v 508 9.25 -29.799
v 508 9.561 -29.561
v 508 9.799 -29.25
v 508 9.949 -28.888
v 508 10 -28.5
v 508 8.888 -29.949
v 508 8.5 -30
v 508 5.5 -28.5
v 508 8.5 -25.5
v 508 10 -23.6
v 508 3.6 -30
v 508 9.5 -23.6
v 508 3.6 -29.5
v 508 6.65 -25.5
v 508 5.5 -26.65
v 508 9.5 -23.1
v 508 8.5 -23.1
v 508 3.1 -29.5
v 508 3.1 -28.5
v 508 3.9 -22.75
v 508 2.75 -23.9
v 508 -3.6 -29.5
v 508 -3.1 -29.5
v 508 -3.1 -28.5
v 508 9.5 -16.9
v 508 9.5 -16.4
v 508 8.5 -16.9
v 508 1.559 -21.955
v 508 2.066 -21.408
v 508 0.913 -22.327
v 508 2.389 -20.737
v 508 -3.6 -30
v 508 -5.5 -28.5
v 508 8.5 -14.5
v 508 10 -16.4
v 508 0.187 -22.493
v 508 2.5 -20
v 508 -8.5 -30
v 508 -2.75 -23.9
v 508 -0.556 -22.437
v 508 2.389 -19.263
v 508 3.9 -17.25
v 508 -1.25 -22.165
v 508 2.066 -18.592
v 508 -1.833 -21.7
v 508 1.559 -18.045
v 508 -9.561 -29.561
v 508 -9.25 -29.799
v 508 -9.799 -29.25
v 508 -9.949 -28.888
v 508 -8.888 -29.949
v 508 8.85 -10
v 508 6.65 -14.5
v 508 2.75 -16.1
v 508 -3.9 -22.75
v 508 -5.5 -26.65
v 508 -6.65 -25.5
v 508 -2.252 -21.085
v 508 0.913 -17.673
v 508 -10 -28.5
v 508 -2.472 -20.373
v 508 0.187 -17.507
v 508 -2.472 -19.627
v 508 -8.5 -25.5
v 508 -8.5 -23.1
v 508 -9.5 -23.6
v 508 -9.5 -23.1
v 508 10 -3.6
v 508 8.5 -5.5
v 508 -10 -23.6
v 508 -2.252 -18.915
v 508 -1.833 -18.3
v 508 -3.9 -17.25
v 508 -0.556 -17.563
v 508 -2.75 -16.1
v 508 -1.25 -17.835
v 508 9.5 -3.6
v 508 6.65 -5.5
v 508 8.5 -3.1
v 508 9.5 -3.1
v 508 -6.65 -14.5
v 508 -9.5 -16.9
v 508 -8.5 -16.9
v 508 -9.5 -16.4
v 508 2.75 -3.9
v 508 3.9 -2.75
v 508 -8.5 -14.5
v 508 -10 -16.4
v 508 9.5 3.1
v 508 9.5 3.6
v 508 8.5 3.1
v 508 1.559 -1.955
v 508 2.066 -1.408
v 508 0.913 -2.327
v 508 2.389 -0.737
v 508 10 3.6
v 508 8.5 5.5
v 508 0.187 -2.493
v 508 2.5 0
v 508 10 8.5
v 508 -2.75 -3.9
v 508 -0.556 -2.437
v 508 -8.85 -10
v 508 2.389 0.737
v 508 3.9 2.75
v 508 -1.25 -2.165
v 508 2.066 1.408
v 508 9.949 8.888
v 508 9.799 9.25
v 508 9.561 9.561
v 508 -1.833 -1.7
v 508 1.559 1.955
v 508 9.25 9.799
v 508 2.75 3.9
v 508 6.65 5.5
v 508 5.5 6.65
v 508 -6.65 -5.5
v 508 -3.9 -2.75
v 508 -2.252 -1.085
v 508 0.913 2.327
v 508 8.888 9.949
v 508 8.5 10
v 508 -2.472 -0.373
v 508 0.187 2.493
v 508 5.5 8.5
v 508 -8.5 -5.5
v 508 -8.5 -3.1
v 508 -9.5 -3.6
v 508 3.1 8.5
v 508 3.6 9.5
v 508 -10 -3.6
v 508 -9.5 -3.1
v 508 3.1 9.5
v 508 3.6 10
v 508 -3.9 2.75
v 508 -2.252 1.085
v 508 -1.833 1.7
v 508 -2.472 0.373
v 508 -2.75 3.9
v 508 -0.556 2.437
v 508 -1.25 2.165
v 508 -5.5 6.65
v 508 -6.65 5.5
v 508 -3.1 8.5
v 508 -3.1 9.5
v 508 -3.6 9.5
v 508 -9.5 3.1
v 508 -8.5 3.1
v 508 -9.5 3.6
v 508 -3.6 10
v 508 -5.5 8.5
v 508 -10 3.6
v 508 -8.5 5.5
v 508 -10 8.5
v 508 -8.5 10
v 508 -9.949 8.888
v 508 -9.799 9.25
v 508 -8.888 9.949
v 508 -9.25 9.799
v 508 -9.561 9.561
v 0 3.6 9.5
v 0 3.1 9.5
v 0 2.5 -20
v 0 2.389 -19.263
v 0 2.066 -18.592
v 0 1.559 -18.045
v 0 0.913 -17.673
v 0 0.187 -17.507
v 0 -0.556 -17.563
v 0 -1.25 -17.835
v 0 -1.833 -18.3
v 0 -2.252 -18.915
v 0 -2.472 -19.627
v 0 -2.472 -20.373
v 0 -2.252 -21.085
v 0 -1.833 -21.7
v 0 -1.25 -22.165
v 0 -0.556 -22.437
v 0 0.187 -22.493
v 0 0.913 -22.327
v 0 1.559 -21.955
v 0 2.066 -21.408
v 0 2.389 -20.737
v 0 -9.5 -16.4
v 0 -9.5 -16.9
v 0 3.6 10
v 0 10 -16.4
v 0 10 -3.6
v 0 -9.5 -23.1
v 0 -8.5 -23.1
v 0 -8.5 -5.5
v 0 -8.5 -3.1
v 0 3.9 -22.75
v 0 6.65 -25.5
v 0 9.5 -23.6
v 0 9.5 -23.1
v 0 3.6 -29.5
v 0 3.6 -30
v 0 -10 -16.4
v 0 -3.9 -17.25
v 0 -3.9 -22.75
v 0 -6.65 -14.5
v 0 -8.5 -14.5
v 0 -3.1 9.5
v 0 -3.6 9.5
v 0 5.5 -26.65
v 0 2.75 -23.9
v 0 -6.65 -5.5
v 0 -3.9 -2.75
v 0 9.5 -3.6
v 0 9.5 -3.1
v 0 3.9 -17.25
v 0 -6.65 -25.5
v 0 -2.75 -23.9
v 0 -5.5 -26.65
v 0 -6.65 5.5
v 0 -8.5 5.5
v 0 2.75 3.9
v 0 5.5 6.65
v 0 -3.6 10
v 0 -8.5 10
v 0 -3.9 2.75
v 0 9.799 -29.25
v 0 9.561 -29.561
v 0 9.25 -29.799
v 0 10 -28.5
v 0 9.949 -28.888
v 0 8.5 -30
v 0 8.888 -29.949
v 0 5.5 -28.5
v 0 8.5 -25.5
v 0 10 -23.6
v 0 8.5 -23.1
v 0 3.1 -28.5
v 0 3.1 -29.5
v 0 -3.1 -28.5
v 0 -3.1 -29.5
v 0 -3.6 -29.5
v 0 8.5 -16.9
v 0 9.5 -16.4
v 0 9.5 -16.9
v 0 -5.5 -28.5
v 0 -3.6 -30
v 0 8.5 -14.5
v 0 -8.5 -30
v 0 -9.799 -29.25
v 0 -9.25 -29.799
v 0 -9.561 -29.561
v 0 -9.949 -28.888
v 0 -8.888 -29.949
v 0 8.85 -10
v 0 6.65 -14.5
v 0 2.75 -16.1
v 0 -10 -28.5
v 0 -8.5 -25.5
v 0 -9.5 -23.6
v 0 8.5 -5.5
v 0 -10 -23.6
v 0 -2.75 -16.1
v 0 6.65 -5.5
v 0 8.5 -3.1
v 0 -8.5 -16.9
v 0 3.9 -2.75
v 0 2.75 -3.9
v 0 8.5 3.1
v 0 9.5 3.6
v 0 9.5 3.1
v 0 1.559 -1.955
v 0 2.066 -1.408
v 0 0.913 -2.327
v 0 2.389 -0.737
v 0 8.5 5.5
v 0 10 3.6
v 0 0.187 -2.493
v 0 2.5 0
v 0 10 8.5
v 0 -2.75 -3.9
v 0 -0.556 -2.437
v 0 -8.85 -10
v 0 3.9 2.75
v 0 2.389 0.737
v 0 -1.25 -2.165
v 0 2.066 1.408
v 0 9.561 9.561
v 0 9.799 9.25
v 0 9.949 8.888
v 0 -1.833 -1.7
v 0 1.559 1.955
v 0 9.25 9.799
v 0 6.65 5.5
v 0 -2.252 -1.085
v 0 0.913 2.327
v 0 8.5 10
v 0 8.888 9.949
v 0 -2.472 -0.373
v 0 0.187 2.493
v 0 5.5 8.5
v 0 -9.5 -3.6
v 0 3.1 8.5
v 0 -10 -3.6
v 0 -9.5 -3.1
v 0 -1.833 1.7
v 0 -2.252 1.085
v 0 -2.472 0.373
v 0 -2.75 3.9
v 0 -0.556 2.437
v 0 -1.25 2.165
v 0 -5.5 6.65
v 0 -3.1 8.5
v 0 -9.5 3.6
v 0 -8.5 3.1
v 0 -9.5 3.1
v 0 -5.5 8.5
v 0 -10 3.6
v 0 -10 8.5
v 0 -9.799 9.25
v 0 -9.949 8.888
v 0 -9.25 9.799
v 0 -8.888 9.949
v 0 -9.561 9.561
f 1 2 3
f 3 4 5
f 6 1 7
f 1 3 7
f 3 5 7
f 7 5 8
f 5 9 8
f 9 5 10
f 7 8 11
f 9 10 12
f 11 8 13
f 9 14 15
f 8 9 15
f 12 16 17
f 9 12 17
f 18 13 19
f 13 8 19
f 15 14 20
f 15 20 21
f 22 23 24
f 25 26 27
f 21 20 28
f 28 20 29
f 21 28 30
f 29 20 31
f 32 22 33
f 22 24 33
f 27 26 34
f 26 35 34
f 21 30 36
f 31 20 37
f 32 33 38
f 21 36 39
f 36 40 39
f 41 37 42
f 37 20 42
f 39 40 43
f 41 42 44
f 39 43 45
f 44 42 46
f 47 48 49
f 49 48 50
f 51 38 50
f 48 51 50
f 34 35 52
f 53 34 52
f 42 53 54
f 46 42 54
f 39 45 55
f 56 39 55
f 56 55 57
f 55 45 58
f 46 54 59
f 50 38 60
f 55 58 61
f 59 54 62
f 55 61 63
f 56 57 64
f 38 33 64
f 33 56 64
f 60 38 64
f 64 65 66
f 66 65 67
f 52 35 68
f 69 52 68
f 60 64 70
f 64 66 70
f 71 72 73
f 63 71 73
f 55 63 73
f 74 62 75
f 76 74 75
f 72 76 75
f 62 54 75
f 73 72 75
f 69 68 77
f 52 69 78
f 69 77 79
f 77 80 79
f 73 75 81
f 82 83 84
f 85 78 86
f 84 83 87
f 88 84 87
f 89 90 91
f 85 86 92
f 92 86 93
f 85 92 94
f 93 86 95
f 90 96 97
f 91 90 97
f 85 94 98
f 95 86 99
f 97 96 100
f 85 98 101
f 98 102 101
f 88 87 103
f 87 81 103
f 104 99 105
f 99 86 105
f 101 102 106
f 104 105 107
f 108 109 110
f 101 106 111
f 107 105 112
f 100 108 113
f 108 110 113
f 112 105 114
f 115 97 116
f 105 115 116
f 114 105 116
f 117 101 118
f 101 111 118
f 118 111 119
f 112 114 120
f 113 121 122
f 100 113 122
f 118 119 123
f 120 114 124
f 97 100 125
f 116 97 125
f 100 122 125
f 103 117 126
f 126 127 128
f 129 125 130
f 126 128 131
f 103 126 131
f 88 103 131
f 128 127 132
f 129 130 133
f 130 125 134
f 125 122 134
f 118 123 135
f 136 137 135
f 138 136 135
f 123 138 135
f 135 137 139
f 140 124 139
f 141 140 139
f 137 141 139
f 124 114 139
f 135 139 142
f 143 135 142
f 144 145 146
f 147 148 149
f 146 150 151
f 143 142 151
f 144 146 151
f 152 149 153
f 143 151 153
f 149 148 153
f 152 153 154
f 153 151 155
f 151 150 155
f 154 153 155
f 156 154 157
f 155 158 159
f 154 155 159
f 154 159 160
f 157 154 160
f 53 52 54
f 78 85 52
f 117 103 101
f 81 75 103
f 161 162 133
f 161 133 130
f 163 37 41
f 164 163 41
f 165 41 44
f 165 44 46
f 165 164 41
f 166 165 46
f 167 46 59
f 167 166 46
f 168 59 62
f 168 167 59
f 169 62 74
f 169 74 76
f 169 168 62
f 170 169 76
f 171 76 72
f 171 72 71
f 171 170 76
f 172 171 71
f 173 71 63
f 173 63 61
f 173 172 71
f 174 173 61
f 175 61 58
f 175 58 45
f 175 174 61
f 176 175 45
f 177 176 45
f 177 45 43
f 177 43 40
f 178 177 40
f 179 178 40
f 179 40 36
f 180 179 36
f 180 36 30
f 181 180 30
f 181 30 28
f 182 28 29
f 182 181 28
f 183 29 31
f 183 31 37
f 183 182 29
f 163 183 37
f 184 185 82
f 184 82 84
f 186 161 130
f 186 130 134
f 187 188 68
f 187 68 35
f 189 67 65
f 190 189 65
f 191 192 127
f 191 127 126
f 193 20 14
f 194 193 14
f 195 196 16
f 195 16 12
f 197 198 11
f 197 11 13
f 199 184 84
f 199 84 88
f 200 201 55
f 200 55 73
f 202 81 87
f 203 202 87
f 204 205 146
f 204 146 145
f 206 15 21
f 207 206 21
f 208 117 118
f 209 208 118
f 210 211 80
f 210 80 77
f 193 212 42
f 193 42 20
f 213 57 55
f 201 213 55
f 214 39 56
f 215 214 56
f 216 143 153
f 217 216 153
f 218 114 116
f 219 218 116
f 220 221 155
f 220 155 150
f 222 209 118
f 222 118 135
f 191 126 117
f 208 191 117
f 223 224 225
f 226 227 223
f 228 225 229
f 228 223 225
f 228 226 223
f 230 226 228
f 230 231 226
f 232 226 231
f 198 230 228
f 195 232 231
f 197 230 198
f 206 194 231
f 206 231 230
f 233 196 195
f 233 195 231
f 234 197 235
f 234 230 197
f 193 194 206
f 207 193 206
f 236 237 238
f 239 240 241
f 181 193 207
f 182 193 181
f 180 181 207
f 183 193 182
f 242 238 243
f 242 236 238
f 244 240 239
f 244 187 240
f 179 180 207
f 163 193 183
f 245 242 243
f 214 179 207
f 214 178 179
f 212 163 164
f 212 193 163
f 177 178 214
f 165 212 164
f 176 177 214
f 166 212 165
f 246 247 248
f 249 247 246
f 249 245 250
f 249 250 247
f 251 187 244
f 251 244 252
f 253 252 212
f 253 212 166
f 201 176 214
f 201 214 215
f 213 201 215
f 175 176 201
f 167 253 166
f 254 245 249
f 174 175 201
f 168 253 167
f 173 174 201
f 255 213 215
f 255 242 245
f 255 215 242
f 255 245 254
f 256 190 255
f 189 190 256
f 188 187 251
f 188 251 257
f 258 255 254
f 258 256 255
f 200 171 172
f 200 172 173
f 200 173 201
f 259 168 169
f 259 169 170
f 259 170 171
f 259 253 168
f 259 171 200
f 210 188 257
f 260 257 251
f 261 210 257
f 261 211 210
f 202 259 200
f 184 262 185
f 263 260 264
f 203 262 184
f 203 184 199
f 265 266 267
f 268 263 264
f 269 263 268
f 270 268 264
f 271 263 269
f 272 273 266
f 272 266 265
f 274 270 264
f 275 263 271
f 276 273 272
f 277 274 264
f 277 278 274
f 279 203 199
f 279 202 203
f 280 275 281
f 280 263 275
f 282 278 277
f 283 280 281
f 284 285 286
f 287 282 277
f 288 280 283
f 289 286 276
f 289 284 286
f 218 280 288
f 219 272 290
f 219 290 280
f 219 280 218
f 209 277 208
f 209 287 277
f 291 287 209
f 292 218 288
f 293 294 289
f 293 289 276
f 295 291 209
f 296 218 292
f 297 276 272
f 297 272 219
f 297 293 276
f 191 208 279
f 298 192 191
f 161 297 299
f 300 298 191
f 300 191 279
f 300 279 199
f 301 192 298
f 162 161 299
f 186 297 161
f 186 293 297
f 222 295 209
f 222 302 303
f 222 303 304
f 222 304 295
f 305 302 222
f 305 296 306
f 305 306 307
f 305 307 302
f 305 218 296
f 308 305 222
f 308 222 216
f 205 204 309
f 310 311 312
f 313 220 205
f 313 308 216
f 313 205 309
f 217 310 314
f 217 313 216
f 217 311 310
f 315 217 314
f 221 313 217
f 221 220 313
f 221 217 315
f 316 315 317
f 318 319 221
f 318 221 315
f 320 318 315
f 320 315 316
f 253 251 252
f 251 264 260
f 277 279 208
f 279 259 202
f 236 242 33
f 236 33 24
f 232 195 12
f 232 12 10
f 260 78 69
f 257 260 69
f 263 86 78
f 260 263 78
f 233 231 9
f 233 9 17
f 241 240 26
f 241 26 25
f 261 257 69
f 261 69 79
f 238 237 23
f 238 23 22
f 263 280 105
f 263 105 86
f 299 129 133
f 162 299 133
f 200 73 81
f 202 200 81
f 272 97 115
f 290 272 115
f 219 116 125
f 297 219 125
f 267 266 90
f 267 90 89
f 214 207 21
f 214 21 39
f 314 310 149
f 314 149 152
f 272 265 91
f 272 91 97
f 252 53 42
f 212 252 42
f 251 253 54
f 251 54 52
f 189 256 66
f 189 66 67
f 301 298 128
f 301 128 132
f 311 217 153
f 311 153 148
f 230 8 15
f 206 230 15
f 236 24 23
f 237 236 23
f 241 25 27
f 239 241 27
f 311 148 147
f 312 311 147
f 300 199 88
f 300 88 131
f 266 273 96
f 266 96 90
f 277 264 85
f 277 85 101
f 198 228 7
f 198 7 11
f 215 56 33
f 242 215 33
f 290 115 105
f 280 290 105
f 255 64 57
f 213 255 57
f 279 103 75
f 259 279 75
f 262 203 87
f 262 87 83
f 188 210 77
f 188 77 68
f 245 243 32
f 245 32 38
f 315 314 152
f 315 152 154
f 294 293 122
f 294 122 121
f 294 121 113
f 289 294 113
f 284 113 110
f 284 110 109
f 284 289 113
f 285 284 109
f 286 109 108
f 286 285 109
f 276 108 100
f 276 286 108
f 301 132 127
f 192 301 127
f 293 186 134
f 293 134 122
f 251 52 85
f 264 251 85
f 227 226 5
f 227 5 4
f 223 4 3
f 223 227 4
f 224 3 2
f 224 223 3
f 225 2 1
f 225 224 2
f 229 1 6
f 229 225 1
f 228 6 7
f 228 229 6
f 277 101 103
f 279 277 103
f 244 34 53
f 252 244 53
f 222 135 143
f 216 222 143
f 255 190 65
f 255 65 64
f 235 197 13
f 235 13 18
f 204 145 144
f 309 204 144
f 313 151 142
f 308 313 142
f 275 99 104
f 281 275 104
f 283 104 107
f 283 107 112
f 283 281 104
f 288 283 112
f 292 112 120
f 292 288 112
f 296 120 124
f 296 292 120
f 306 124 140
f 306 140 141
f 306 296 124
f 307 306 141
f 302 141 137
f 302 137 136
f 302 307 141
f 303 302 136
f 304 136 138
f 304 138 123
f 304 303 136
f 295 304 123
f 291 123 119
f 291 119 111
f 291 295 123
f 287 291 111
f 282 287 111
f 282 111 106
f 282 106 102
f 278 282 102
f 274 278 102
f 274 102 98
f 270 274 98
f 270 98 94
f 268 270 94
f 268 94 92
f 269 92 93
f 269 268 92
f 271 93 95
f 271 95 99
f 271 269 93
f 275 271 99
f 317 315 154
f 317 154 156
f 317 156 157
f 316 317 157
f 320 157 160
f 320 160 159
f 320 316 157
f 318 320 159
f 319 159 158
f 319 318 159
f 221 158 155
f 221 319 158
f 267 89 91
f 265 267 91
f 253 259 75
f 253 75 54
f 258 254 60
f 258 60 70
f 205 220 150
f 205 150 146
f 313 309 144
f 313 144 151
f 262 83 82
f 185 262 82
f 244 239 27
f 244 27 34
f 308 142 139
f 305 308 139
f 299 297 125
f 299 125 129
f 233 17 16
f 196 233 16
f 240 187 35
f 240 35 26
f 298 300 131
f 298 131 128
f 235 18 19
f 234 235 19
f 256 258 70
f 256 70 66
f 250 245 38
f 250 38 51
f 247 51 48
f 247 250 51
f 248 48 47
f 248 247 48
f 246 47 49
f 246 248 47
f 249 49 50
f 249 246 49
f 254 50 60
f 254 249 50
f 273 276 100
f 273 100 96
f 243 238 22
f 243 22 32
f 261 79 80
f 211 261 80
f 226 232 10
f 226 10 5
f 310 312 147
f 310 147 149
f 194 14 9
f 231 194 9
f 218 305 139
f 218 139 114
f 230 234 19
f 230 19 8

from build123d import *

# Parameters (mm, degrees)
SKETCH11_R               = 2.5
F_20_X_40_X_T1_5_1_DEPTH = 508


with BuildPart() as part:
    # Sketch11 → 铝型材 20 X 40 X T1.5(1) (new body)
    with BuildSketch(Plane.YZ):
        with BuildLine():
            Line((-3.6, 10), (-3.6, 9.5))
            Line((-3.6, 9.5), (-3.1, 9.5))
            Line((-3.1, 9.5), (-3.1, 8.5))
            Line((-3.1, 8.5), (-5.5, 8.5))
            Line((-5.5, 8.5), (-5.5, 6.65))
            Line((-5.5, 6.65), (-2.75, 3.9))
            Line((-2.75, 3.9), (2.75, 3.9))
            Line((2.75, 3.9), (5.5, 6.65))
            Line((5.5, 6.65), (5.5, 8.5))
            Line((5.5, 8.5), (3.1, 8.5))
            Line((3.1, 8.5), (3.1, 9.5))
            Line((3.1, 9.5), (3.6, 9.5))
            Line((3.6, 9.5), (3.6, 10))
            Line((3.6, 10), (8.5, 10))
            ThreePointArc((8.5, 10), (9.560660172, 9.560660172), (10, 8.5))
            Line((10, 8.5), (10, 3.6))
            Line((10, 3.6), (9.5, 3.6))
            Line((9.5, 3.6), (9.5, 3.1))
            Line((9.5, 3.1), (8.5, 3.1))
            Line((8.5, 3.1), (8.5, 5.5))
            Line((8.5, 5.5), (6.65, 5.5))
            Line((6.65, 5.5), (3.9, 2.75))
            Line((3.9, 2.75), (3.9, -2.75))
            Line((3.9, -2.75), (6.65, -5.5))
            Line((6.65, -5.5), (8.5, -5.5))
            Line((8.5, -5.5), (8.5, -3.1))
            Line((8.5, -3.1), (9.5, -3.1))
            Line((9.5, -3.1), (9.5, -3.6))
            Line((9.5, -3.6), (10, -3.6))
            Line((10, -3.6), (10, -16.4))
            Line((10, -16.4), (9.5, -16.4))
            Line((9.5, -16.4), (9.5, -16.9))
            Line((9.5, -16.9), (8.5, -16.9))
            Line((8.5, -16.9), (8.5, -14.5))
            Line((8.5, -14.5), (6.65, -14.5))
            Line((6.65, -14.5), (3.9, -17.25))
            Line((3.9, -17.25), (3.9, -22.75))
            Line((3.9, -22.75), (6.65, -25.5))
            Line((6.65, -25.5), (8.5, -25.5))
            Line((8.5, -25.5), (8.5, -23.1))
            Line((8.5, -23.1), (9.5, -23.1))
            Line((9.5, -23.1), (9.5, -23.6))
            Line((9.5, -23.6), (10, -23.6))
            Line((10, -23.6), (10, -28.5))
            ThreePointArc((10, -28.5), (9.560660172, -29.560660172), (8.5, -30))
            Line((8.5, -30), (3.6, -30))
            Line((3.6, -30), (3.6, -29.5))
            Line((3.6, -29.5), (3.1, -29.5))
            Line((3.1, -29.5), (3.1, -28.5))
            Line((3.1, -28.5), (5.5, -28.5))
            Line((5.5, -28.5), (5.5, -26.65))
            Line((5.5, -26.65), (2.75, -23.9))
            Line((2.75, -23.9), (-2.75, -23.9))
            Line((-2.75, -23.9), (-5.5, -26.65))
            Line((-5.5, -26.65), (-5.5, -28.5))
            Line((-5.5, -28.5), (-3.1, -28.5))
            Line((-3.1, -28.5), (-3.1, -29.5))
            Line((-3.1, -29.5), (-3.6, -29.5))
            Line((-3.6, -29.5), (-3.6, -30))
            Line((-3.6, -30), (-8.5, -30))
            ThreePointArc((-8.5, -30), (-9.560660172, -29.560660172), (-10, -28.5))
            Line((-10, -28.5), (-10, -23.6))
            Line((-10, -23.6), (-9.5, -23.6))
            Line((-9.5, -23.6), (-9.5, -23.1))
            Line((-9.5, -23.1), (-8.5, -23.1))
            Line((-8.5, -23.1), (-8.5, -25.5))
            Line((-8.5, -25.5), (-6.65, -25.5))
            Line((-6.65, -25.5), (-3.9, -22.75))
            Line((-3.9, -22.75), (-3.9, -17.25))
            Line((-3.9, -17.25), (-6.65, -14.5))
            Line((-6.65, -14.5), (-8.5, -14.5))
            Line((-8.5, -14.5), (-8.5, -16.9))
            Line((-8.5, -16.9), (-9.5, -16.9))
            Line((-9.5, -16.9), (-9.5, -16.4))
            Line((-9.5, -16.4), (-10, -16.4))
            Line((-10, -16.4), (-10, -3.6))
            Line((-10, -3.6), (-9.5, -3.6))
            Line((-9.5, -3.6), (-9.5, -3.1))
            Line((-9.5, -3.1), (-8.5, -3.1))
            Line((-8.5, -3.1), (-8.5, -5.5))
            Line((-8.5, -5.5), (-6.65, -5.5))
            Line((-6.65, -5.5), (-3.9, -2.75))
            Line((-3.9, -2.75), (-3.9, 2.75))
            Line((-3.9, 2.75), (-6.65, 5.5))
            Line((-6.65, 5.5), (-8.5, 5.5))
            Line((-8.5, 5.5), (-8.5, 3.1))
            Line((-8.5, 3.1), (-9.5, 3.1))
            Line((-9.5, 3.1), (-9.5, 3.6))
            Line((-9.5, 3.6), (-10, 3.6))
            Line((-10, 3.6), (-10, 8.5))
            ThreePointArc((-10, 8.5), (-9.560660172, 9.560660172), (-8.5, 10))
            Line((-8.5, 10), (-3.6, 10))
        make_face()
        Circle(SKETCH11_R, mode=Mode.SUBTRACT)
        with Locations((0, -20)):
            Circle(SKETCH11_R, mode=Mode.SUBTRACT)
        Polygon((8.85, -10), (2.75, -3.9), (-2.75, -3.9), (-8.85, -10), (-2.75, -16.1), (2.75, -16.1), align=None, mode=Mode.SUBTRACT)
    extrude(amount=F_20_X_40_X_T1_5_1_DEPTH)


solid = part.part
